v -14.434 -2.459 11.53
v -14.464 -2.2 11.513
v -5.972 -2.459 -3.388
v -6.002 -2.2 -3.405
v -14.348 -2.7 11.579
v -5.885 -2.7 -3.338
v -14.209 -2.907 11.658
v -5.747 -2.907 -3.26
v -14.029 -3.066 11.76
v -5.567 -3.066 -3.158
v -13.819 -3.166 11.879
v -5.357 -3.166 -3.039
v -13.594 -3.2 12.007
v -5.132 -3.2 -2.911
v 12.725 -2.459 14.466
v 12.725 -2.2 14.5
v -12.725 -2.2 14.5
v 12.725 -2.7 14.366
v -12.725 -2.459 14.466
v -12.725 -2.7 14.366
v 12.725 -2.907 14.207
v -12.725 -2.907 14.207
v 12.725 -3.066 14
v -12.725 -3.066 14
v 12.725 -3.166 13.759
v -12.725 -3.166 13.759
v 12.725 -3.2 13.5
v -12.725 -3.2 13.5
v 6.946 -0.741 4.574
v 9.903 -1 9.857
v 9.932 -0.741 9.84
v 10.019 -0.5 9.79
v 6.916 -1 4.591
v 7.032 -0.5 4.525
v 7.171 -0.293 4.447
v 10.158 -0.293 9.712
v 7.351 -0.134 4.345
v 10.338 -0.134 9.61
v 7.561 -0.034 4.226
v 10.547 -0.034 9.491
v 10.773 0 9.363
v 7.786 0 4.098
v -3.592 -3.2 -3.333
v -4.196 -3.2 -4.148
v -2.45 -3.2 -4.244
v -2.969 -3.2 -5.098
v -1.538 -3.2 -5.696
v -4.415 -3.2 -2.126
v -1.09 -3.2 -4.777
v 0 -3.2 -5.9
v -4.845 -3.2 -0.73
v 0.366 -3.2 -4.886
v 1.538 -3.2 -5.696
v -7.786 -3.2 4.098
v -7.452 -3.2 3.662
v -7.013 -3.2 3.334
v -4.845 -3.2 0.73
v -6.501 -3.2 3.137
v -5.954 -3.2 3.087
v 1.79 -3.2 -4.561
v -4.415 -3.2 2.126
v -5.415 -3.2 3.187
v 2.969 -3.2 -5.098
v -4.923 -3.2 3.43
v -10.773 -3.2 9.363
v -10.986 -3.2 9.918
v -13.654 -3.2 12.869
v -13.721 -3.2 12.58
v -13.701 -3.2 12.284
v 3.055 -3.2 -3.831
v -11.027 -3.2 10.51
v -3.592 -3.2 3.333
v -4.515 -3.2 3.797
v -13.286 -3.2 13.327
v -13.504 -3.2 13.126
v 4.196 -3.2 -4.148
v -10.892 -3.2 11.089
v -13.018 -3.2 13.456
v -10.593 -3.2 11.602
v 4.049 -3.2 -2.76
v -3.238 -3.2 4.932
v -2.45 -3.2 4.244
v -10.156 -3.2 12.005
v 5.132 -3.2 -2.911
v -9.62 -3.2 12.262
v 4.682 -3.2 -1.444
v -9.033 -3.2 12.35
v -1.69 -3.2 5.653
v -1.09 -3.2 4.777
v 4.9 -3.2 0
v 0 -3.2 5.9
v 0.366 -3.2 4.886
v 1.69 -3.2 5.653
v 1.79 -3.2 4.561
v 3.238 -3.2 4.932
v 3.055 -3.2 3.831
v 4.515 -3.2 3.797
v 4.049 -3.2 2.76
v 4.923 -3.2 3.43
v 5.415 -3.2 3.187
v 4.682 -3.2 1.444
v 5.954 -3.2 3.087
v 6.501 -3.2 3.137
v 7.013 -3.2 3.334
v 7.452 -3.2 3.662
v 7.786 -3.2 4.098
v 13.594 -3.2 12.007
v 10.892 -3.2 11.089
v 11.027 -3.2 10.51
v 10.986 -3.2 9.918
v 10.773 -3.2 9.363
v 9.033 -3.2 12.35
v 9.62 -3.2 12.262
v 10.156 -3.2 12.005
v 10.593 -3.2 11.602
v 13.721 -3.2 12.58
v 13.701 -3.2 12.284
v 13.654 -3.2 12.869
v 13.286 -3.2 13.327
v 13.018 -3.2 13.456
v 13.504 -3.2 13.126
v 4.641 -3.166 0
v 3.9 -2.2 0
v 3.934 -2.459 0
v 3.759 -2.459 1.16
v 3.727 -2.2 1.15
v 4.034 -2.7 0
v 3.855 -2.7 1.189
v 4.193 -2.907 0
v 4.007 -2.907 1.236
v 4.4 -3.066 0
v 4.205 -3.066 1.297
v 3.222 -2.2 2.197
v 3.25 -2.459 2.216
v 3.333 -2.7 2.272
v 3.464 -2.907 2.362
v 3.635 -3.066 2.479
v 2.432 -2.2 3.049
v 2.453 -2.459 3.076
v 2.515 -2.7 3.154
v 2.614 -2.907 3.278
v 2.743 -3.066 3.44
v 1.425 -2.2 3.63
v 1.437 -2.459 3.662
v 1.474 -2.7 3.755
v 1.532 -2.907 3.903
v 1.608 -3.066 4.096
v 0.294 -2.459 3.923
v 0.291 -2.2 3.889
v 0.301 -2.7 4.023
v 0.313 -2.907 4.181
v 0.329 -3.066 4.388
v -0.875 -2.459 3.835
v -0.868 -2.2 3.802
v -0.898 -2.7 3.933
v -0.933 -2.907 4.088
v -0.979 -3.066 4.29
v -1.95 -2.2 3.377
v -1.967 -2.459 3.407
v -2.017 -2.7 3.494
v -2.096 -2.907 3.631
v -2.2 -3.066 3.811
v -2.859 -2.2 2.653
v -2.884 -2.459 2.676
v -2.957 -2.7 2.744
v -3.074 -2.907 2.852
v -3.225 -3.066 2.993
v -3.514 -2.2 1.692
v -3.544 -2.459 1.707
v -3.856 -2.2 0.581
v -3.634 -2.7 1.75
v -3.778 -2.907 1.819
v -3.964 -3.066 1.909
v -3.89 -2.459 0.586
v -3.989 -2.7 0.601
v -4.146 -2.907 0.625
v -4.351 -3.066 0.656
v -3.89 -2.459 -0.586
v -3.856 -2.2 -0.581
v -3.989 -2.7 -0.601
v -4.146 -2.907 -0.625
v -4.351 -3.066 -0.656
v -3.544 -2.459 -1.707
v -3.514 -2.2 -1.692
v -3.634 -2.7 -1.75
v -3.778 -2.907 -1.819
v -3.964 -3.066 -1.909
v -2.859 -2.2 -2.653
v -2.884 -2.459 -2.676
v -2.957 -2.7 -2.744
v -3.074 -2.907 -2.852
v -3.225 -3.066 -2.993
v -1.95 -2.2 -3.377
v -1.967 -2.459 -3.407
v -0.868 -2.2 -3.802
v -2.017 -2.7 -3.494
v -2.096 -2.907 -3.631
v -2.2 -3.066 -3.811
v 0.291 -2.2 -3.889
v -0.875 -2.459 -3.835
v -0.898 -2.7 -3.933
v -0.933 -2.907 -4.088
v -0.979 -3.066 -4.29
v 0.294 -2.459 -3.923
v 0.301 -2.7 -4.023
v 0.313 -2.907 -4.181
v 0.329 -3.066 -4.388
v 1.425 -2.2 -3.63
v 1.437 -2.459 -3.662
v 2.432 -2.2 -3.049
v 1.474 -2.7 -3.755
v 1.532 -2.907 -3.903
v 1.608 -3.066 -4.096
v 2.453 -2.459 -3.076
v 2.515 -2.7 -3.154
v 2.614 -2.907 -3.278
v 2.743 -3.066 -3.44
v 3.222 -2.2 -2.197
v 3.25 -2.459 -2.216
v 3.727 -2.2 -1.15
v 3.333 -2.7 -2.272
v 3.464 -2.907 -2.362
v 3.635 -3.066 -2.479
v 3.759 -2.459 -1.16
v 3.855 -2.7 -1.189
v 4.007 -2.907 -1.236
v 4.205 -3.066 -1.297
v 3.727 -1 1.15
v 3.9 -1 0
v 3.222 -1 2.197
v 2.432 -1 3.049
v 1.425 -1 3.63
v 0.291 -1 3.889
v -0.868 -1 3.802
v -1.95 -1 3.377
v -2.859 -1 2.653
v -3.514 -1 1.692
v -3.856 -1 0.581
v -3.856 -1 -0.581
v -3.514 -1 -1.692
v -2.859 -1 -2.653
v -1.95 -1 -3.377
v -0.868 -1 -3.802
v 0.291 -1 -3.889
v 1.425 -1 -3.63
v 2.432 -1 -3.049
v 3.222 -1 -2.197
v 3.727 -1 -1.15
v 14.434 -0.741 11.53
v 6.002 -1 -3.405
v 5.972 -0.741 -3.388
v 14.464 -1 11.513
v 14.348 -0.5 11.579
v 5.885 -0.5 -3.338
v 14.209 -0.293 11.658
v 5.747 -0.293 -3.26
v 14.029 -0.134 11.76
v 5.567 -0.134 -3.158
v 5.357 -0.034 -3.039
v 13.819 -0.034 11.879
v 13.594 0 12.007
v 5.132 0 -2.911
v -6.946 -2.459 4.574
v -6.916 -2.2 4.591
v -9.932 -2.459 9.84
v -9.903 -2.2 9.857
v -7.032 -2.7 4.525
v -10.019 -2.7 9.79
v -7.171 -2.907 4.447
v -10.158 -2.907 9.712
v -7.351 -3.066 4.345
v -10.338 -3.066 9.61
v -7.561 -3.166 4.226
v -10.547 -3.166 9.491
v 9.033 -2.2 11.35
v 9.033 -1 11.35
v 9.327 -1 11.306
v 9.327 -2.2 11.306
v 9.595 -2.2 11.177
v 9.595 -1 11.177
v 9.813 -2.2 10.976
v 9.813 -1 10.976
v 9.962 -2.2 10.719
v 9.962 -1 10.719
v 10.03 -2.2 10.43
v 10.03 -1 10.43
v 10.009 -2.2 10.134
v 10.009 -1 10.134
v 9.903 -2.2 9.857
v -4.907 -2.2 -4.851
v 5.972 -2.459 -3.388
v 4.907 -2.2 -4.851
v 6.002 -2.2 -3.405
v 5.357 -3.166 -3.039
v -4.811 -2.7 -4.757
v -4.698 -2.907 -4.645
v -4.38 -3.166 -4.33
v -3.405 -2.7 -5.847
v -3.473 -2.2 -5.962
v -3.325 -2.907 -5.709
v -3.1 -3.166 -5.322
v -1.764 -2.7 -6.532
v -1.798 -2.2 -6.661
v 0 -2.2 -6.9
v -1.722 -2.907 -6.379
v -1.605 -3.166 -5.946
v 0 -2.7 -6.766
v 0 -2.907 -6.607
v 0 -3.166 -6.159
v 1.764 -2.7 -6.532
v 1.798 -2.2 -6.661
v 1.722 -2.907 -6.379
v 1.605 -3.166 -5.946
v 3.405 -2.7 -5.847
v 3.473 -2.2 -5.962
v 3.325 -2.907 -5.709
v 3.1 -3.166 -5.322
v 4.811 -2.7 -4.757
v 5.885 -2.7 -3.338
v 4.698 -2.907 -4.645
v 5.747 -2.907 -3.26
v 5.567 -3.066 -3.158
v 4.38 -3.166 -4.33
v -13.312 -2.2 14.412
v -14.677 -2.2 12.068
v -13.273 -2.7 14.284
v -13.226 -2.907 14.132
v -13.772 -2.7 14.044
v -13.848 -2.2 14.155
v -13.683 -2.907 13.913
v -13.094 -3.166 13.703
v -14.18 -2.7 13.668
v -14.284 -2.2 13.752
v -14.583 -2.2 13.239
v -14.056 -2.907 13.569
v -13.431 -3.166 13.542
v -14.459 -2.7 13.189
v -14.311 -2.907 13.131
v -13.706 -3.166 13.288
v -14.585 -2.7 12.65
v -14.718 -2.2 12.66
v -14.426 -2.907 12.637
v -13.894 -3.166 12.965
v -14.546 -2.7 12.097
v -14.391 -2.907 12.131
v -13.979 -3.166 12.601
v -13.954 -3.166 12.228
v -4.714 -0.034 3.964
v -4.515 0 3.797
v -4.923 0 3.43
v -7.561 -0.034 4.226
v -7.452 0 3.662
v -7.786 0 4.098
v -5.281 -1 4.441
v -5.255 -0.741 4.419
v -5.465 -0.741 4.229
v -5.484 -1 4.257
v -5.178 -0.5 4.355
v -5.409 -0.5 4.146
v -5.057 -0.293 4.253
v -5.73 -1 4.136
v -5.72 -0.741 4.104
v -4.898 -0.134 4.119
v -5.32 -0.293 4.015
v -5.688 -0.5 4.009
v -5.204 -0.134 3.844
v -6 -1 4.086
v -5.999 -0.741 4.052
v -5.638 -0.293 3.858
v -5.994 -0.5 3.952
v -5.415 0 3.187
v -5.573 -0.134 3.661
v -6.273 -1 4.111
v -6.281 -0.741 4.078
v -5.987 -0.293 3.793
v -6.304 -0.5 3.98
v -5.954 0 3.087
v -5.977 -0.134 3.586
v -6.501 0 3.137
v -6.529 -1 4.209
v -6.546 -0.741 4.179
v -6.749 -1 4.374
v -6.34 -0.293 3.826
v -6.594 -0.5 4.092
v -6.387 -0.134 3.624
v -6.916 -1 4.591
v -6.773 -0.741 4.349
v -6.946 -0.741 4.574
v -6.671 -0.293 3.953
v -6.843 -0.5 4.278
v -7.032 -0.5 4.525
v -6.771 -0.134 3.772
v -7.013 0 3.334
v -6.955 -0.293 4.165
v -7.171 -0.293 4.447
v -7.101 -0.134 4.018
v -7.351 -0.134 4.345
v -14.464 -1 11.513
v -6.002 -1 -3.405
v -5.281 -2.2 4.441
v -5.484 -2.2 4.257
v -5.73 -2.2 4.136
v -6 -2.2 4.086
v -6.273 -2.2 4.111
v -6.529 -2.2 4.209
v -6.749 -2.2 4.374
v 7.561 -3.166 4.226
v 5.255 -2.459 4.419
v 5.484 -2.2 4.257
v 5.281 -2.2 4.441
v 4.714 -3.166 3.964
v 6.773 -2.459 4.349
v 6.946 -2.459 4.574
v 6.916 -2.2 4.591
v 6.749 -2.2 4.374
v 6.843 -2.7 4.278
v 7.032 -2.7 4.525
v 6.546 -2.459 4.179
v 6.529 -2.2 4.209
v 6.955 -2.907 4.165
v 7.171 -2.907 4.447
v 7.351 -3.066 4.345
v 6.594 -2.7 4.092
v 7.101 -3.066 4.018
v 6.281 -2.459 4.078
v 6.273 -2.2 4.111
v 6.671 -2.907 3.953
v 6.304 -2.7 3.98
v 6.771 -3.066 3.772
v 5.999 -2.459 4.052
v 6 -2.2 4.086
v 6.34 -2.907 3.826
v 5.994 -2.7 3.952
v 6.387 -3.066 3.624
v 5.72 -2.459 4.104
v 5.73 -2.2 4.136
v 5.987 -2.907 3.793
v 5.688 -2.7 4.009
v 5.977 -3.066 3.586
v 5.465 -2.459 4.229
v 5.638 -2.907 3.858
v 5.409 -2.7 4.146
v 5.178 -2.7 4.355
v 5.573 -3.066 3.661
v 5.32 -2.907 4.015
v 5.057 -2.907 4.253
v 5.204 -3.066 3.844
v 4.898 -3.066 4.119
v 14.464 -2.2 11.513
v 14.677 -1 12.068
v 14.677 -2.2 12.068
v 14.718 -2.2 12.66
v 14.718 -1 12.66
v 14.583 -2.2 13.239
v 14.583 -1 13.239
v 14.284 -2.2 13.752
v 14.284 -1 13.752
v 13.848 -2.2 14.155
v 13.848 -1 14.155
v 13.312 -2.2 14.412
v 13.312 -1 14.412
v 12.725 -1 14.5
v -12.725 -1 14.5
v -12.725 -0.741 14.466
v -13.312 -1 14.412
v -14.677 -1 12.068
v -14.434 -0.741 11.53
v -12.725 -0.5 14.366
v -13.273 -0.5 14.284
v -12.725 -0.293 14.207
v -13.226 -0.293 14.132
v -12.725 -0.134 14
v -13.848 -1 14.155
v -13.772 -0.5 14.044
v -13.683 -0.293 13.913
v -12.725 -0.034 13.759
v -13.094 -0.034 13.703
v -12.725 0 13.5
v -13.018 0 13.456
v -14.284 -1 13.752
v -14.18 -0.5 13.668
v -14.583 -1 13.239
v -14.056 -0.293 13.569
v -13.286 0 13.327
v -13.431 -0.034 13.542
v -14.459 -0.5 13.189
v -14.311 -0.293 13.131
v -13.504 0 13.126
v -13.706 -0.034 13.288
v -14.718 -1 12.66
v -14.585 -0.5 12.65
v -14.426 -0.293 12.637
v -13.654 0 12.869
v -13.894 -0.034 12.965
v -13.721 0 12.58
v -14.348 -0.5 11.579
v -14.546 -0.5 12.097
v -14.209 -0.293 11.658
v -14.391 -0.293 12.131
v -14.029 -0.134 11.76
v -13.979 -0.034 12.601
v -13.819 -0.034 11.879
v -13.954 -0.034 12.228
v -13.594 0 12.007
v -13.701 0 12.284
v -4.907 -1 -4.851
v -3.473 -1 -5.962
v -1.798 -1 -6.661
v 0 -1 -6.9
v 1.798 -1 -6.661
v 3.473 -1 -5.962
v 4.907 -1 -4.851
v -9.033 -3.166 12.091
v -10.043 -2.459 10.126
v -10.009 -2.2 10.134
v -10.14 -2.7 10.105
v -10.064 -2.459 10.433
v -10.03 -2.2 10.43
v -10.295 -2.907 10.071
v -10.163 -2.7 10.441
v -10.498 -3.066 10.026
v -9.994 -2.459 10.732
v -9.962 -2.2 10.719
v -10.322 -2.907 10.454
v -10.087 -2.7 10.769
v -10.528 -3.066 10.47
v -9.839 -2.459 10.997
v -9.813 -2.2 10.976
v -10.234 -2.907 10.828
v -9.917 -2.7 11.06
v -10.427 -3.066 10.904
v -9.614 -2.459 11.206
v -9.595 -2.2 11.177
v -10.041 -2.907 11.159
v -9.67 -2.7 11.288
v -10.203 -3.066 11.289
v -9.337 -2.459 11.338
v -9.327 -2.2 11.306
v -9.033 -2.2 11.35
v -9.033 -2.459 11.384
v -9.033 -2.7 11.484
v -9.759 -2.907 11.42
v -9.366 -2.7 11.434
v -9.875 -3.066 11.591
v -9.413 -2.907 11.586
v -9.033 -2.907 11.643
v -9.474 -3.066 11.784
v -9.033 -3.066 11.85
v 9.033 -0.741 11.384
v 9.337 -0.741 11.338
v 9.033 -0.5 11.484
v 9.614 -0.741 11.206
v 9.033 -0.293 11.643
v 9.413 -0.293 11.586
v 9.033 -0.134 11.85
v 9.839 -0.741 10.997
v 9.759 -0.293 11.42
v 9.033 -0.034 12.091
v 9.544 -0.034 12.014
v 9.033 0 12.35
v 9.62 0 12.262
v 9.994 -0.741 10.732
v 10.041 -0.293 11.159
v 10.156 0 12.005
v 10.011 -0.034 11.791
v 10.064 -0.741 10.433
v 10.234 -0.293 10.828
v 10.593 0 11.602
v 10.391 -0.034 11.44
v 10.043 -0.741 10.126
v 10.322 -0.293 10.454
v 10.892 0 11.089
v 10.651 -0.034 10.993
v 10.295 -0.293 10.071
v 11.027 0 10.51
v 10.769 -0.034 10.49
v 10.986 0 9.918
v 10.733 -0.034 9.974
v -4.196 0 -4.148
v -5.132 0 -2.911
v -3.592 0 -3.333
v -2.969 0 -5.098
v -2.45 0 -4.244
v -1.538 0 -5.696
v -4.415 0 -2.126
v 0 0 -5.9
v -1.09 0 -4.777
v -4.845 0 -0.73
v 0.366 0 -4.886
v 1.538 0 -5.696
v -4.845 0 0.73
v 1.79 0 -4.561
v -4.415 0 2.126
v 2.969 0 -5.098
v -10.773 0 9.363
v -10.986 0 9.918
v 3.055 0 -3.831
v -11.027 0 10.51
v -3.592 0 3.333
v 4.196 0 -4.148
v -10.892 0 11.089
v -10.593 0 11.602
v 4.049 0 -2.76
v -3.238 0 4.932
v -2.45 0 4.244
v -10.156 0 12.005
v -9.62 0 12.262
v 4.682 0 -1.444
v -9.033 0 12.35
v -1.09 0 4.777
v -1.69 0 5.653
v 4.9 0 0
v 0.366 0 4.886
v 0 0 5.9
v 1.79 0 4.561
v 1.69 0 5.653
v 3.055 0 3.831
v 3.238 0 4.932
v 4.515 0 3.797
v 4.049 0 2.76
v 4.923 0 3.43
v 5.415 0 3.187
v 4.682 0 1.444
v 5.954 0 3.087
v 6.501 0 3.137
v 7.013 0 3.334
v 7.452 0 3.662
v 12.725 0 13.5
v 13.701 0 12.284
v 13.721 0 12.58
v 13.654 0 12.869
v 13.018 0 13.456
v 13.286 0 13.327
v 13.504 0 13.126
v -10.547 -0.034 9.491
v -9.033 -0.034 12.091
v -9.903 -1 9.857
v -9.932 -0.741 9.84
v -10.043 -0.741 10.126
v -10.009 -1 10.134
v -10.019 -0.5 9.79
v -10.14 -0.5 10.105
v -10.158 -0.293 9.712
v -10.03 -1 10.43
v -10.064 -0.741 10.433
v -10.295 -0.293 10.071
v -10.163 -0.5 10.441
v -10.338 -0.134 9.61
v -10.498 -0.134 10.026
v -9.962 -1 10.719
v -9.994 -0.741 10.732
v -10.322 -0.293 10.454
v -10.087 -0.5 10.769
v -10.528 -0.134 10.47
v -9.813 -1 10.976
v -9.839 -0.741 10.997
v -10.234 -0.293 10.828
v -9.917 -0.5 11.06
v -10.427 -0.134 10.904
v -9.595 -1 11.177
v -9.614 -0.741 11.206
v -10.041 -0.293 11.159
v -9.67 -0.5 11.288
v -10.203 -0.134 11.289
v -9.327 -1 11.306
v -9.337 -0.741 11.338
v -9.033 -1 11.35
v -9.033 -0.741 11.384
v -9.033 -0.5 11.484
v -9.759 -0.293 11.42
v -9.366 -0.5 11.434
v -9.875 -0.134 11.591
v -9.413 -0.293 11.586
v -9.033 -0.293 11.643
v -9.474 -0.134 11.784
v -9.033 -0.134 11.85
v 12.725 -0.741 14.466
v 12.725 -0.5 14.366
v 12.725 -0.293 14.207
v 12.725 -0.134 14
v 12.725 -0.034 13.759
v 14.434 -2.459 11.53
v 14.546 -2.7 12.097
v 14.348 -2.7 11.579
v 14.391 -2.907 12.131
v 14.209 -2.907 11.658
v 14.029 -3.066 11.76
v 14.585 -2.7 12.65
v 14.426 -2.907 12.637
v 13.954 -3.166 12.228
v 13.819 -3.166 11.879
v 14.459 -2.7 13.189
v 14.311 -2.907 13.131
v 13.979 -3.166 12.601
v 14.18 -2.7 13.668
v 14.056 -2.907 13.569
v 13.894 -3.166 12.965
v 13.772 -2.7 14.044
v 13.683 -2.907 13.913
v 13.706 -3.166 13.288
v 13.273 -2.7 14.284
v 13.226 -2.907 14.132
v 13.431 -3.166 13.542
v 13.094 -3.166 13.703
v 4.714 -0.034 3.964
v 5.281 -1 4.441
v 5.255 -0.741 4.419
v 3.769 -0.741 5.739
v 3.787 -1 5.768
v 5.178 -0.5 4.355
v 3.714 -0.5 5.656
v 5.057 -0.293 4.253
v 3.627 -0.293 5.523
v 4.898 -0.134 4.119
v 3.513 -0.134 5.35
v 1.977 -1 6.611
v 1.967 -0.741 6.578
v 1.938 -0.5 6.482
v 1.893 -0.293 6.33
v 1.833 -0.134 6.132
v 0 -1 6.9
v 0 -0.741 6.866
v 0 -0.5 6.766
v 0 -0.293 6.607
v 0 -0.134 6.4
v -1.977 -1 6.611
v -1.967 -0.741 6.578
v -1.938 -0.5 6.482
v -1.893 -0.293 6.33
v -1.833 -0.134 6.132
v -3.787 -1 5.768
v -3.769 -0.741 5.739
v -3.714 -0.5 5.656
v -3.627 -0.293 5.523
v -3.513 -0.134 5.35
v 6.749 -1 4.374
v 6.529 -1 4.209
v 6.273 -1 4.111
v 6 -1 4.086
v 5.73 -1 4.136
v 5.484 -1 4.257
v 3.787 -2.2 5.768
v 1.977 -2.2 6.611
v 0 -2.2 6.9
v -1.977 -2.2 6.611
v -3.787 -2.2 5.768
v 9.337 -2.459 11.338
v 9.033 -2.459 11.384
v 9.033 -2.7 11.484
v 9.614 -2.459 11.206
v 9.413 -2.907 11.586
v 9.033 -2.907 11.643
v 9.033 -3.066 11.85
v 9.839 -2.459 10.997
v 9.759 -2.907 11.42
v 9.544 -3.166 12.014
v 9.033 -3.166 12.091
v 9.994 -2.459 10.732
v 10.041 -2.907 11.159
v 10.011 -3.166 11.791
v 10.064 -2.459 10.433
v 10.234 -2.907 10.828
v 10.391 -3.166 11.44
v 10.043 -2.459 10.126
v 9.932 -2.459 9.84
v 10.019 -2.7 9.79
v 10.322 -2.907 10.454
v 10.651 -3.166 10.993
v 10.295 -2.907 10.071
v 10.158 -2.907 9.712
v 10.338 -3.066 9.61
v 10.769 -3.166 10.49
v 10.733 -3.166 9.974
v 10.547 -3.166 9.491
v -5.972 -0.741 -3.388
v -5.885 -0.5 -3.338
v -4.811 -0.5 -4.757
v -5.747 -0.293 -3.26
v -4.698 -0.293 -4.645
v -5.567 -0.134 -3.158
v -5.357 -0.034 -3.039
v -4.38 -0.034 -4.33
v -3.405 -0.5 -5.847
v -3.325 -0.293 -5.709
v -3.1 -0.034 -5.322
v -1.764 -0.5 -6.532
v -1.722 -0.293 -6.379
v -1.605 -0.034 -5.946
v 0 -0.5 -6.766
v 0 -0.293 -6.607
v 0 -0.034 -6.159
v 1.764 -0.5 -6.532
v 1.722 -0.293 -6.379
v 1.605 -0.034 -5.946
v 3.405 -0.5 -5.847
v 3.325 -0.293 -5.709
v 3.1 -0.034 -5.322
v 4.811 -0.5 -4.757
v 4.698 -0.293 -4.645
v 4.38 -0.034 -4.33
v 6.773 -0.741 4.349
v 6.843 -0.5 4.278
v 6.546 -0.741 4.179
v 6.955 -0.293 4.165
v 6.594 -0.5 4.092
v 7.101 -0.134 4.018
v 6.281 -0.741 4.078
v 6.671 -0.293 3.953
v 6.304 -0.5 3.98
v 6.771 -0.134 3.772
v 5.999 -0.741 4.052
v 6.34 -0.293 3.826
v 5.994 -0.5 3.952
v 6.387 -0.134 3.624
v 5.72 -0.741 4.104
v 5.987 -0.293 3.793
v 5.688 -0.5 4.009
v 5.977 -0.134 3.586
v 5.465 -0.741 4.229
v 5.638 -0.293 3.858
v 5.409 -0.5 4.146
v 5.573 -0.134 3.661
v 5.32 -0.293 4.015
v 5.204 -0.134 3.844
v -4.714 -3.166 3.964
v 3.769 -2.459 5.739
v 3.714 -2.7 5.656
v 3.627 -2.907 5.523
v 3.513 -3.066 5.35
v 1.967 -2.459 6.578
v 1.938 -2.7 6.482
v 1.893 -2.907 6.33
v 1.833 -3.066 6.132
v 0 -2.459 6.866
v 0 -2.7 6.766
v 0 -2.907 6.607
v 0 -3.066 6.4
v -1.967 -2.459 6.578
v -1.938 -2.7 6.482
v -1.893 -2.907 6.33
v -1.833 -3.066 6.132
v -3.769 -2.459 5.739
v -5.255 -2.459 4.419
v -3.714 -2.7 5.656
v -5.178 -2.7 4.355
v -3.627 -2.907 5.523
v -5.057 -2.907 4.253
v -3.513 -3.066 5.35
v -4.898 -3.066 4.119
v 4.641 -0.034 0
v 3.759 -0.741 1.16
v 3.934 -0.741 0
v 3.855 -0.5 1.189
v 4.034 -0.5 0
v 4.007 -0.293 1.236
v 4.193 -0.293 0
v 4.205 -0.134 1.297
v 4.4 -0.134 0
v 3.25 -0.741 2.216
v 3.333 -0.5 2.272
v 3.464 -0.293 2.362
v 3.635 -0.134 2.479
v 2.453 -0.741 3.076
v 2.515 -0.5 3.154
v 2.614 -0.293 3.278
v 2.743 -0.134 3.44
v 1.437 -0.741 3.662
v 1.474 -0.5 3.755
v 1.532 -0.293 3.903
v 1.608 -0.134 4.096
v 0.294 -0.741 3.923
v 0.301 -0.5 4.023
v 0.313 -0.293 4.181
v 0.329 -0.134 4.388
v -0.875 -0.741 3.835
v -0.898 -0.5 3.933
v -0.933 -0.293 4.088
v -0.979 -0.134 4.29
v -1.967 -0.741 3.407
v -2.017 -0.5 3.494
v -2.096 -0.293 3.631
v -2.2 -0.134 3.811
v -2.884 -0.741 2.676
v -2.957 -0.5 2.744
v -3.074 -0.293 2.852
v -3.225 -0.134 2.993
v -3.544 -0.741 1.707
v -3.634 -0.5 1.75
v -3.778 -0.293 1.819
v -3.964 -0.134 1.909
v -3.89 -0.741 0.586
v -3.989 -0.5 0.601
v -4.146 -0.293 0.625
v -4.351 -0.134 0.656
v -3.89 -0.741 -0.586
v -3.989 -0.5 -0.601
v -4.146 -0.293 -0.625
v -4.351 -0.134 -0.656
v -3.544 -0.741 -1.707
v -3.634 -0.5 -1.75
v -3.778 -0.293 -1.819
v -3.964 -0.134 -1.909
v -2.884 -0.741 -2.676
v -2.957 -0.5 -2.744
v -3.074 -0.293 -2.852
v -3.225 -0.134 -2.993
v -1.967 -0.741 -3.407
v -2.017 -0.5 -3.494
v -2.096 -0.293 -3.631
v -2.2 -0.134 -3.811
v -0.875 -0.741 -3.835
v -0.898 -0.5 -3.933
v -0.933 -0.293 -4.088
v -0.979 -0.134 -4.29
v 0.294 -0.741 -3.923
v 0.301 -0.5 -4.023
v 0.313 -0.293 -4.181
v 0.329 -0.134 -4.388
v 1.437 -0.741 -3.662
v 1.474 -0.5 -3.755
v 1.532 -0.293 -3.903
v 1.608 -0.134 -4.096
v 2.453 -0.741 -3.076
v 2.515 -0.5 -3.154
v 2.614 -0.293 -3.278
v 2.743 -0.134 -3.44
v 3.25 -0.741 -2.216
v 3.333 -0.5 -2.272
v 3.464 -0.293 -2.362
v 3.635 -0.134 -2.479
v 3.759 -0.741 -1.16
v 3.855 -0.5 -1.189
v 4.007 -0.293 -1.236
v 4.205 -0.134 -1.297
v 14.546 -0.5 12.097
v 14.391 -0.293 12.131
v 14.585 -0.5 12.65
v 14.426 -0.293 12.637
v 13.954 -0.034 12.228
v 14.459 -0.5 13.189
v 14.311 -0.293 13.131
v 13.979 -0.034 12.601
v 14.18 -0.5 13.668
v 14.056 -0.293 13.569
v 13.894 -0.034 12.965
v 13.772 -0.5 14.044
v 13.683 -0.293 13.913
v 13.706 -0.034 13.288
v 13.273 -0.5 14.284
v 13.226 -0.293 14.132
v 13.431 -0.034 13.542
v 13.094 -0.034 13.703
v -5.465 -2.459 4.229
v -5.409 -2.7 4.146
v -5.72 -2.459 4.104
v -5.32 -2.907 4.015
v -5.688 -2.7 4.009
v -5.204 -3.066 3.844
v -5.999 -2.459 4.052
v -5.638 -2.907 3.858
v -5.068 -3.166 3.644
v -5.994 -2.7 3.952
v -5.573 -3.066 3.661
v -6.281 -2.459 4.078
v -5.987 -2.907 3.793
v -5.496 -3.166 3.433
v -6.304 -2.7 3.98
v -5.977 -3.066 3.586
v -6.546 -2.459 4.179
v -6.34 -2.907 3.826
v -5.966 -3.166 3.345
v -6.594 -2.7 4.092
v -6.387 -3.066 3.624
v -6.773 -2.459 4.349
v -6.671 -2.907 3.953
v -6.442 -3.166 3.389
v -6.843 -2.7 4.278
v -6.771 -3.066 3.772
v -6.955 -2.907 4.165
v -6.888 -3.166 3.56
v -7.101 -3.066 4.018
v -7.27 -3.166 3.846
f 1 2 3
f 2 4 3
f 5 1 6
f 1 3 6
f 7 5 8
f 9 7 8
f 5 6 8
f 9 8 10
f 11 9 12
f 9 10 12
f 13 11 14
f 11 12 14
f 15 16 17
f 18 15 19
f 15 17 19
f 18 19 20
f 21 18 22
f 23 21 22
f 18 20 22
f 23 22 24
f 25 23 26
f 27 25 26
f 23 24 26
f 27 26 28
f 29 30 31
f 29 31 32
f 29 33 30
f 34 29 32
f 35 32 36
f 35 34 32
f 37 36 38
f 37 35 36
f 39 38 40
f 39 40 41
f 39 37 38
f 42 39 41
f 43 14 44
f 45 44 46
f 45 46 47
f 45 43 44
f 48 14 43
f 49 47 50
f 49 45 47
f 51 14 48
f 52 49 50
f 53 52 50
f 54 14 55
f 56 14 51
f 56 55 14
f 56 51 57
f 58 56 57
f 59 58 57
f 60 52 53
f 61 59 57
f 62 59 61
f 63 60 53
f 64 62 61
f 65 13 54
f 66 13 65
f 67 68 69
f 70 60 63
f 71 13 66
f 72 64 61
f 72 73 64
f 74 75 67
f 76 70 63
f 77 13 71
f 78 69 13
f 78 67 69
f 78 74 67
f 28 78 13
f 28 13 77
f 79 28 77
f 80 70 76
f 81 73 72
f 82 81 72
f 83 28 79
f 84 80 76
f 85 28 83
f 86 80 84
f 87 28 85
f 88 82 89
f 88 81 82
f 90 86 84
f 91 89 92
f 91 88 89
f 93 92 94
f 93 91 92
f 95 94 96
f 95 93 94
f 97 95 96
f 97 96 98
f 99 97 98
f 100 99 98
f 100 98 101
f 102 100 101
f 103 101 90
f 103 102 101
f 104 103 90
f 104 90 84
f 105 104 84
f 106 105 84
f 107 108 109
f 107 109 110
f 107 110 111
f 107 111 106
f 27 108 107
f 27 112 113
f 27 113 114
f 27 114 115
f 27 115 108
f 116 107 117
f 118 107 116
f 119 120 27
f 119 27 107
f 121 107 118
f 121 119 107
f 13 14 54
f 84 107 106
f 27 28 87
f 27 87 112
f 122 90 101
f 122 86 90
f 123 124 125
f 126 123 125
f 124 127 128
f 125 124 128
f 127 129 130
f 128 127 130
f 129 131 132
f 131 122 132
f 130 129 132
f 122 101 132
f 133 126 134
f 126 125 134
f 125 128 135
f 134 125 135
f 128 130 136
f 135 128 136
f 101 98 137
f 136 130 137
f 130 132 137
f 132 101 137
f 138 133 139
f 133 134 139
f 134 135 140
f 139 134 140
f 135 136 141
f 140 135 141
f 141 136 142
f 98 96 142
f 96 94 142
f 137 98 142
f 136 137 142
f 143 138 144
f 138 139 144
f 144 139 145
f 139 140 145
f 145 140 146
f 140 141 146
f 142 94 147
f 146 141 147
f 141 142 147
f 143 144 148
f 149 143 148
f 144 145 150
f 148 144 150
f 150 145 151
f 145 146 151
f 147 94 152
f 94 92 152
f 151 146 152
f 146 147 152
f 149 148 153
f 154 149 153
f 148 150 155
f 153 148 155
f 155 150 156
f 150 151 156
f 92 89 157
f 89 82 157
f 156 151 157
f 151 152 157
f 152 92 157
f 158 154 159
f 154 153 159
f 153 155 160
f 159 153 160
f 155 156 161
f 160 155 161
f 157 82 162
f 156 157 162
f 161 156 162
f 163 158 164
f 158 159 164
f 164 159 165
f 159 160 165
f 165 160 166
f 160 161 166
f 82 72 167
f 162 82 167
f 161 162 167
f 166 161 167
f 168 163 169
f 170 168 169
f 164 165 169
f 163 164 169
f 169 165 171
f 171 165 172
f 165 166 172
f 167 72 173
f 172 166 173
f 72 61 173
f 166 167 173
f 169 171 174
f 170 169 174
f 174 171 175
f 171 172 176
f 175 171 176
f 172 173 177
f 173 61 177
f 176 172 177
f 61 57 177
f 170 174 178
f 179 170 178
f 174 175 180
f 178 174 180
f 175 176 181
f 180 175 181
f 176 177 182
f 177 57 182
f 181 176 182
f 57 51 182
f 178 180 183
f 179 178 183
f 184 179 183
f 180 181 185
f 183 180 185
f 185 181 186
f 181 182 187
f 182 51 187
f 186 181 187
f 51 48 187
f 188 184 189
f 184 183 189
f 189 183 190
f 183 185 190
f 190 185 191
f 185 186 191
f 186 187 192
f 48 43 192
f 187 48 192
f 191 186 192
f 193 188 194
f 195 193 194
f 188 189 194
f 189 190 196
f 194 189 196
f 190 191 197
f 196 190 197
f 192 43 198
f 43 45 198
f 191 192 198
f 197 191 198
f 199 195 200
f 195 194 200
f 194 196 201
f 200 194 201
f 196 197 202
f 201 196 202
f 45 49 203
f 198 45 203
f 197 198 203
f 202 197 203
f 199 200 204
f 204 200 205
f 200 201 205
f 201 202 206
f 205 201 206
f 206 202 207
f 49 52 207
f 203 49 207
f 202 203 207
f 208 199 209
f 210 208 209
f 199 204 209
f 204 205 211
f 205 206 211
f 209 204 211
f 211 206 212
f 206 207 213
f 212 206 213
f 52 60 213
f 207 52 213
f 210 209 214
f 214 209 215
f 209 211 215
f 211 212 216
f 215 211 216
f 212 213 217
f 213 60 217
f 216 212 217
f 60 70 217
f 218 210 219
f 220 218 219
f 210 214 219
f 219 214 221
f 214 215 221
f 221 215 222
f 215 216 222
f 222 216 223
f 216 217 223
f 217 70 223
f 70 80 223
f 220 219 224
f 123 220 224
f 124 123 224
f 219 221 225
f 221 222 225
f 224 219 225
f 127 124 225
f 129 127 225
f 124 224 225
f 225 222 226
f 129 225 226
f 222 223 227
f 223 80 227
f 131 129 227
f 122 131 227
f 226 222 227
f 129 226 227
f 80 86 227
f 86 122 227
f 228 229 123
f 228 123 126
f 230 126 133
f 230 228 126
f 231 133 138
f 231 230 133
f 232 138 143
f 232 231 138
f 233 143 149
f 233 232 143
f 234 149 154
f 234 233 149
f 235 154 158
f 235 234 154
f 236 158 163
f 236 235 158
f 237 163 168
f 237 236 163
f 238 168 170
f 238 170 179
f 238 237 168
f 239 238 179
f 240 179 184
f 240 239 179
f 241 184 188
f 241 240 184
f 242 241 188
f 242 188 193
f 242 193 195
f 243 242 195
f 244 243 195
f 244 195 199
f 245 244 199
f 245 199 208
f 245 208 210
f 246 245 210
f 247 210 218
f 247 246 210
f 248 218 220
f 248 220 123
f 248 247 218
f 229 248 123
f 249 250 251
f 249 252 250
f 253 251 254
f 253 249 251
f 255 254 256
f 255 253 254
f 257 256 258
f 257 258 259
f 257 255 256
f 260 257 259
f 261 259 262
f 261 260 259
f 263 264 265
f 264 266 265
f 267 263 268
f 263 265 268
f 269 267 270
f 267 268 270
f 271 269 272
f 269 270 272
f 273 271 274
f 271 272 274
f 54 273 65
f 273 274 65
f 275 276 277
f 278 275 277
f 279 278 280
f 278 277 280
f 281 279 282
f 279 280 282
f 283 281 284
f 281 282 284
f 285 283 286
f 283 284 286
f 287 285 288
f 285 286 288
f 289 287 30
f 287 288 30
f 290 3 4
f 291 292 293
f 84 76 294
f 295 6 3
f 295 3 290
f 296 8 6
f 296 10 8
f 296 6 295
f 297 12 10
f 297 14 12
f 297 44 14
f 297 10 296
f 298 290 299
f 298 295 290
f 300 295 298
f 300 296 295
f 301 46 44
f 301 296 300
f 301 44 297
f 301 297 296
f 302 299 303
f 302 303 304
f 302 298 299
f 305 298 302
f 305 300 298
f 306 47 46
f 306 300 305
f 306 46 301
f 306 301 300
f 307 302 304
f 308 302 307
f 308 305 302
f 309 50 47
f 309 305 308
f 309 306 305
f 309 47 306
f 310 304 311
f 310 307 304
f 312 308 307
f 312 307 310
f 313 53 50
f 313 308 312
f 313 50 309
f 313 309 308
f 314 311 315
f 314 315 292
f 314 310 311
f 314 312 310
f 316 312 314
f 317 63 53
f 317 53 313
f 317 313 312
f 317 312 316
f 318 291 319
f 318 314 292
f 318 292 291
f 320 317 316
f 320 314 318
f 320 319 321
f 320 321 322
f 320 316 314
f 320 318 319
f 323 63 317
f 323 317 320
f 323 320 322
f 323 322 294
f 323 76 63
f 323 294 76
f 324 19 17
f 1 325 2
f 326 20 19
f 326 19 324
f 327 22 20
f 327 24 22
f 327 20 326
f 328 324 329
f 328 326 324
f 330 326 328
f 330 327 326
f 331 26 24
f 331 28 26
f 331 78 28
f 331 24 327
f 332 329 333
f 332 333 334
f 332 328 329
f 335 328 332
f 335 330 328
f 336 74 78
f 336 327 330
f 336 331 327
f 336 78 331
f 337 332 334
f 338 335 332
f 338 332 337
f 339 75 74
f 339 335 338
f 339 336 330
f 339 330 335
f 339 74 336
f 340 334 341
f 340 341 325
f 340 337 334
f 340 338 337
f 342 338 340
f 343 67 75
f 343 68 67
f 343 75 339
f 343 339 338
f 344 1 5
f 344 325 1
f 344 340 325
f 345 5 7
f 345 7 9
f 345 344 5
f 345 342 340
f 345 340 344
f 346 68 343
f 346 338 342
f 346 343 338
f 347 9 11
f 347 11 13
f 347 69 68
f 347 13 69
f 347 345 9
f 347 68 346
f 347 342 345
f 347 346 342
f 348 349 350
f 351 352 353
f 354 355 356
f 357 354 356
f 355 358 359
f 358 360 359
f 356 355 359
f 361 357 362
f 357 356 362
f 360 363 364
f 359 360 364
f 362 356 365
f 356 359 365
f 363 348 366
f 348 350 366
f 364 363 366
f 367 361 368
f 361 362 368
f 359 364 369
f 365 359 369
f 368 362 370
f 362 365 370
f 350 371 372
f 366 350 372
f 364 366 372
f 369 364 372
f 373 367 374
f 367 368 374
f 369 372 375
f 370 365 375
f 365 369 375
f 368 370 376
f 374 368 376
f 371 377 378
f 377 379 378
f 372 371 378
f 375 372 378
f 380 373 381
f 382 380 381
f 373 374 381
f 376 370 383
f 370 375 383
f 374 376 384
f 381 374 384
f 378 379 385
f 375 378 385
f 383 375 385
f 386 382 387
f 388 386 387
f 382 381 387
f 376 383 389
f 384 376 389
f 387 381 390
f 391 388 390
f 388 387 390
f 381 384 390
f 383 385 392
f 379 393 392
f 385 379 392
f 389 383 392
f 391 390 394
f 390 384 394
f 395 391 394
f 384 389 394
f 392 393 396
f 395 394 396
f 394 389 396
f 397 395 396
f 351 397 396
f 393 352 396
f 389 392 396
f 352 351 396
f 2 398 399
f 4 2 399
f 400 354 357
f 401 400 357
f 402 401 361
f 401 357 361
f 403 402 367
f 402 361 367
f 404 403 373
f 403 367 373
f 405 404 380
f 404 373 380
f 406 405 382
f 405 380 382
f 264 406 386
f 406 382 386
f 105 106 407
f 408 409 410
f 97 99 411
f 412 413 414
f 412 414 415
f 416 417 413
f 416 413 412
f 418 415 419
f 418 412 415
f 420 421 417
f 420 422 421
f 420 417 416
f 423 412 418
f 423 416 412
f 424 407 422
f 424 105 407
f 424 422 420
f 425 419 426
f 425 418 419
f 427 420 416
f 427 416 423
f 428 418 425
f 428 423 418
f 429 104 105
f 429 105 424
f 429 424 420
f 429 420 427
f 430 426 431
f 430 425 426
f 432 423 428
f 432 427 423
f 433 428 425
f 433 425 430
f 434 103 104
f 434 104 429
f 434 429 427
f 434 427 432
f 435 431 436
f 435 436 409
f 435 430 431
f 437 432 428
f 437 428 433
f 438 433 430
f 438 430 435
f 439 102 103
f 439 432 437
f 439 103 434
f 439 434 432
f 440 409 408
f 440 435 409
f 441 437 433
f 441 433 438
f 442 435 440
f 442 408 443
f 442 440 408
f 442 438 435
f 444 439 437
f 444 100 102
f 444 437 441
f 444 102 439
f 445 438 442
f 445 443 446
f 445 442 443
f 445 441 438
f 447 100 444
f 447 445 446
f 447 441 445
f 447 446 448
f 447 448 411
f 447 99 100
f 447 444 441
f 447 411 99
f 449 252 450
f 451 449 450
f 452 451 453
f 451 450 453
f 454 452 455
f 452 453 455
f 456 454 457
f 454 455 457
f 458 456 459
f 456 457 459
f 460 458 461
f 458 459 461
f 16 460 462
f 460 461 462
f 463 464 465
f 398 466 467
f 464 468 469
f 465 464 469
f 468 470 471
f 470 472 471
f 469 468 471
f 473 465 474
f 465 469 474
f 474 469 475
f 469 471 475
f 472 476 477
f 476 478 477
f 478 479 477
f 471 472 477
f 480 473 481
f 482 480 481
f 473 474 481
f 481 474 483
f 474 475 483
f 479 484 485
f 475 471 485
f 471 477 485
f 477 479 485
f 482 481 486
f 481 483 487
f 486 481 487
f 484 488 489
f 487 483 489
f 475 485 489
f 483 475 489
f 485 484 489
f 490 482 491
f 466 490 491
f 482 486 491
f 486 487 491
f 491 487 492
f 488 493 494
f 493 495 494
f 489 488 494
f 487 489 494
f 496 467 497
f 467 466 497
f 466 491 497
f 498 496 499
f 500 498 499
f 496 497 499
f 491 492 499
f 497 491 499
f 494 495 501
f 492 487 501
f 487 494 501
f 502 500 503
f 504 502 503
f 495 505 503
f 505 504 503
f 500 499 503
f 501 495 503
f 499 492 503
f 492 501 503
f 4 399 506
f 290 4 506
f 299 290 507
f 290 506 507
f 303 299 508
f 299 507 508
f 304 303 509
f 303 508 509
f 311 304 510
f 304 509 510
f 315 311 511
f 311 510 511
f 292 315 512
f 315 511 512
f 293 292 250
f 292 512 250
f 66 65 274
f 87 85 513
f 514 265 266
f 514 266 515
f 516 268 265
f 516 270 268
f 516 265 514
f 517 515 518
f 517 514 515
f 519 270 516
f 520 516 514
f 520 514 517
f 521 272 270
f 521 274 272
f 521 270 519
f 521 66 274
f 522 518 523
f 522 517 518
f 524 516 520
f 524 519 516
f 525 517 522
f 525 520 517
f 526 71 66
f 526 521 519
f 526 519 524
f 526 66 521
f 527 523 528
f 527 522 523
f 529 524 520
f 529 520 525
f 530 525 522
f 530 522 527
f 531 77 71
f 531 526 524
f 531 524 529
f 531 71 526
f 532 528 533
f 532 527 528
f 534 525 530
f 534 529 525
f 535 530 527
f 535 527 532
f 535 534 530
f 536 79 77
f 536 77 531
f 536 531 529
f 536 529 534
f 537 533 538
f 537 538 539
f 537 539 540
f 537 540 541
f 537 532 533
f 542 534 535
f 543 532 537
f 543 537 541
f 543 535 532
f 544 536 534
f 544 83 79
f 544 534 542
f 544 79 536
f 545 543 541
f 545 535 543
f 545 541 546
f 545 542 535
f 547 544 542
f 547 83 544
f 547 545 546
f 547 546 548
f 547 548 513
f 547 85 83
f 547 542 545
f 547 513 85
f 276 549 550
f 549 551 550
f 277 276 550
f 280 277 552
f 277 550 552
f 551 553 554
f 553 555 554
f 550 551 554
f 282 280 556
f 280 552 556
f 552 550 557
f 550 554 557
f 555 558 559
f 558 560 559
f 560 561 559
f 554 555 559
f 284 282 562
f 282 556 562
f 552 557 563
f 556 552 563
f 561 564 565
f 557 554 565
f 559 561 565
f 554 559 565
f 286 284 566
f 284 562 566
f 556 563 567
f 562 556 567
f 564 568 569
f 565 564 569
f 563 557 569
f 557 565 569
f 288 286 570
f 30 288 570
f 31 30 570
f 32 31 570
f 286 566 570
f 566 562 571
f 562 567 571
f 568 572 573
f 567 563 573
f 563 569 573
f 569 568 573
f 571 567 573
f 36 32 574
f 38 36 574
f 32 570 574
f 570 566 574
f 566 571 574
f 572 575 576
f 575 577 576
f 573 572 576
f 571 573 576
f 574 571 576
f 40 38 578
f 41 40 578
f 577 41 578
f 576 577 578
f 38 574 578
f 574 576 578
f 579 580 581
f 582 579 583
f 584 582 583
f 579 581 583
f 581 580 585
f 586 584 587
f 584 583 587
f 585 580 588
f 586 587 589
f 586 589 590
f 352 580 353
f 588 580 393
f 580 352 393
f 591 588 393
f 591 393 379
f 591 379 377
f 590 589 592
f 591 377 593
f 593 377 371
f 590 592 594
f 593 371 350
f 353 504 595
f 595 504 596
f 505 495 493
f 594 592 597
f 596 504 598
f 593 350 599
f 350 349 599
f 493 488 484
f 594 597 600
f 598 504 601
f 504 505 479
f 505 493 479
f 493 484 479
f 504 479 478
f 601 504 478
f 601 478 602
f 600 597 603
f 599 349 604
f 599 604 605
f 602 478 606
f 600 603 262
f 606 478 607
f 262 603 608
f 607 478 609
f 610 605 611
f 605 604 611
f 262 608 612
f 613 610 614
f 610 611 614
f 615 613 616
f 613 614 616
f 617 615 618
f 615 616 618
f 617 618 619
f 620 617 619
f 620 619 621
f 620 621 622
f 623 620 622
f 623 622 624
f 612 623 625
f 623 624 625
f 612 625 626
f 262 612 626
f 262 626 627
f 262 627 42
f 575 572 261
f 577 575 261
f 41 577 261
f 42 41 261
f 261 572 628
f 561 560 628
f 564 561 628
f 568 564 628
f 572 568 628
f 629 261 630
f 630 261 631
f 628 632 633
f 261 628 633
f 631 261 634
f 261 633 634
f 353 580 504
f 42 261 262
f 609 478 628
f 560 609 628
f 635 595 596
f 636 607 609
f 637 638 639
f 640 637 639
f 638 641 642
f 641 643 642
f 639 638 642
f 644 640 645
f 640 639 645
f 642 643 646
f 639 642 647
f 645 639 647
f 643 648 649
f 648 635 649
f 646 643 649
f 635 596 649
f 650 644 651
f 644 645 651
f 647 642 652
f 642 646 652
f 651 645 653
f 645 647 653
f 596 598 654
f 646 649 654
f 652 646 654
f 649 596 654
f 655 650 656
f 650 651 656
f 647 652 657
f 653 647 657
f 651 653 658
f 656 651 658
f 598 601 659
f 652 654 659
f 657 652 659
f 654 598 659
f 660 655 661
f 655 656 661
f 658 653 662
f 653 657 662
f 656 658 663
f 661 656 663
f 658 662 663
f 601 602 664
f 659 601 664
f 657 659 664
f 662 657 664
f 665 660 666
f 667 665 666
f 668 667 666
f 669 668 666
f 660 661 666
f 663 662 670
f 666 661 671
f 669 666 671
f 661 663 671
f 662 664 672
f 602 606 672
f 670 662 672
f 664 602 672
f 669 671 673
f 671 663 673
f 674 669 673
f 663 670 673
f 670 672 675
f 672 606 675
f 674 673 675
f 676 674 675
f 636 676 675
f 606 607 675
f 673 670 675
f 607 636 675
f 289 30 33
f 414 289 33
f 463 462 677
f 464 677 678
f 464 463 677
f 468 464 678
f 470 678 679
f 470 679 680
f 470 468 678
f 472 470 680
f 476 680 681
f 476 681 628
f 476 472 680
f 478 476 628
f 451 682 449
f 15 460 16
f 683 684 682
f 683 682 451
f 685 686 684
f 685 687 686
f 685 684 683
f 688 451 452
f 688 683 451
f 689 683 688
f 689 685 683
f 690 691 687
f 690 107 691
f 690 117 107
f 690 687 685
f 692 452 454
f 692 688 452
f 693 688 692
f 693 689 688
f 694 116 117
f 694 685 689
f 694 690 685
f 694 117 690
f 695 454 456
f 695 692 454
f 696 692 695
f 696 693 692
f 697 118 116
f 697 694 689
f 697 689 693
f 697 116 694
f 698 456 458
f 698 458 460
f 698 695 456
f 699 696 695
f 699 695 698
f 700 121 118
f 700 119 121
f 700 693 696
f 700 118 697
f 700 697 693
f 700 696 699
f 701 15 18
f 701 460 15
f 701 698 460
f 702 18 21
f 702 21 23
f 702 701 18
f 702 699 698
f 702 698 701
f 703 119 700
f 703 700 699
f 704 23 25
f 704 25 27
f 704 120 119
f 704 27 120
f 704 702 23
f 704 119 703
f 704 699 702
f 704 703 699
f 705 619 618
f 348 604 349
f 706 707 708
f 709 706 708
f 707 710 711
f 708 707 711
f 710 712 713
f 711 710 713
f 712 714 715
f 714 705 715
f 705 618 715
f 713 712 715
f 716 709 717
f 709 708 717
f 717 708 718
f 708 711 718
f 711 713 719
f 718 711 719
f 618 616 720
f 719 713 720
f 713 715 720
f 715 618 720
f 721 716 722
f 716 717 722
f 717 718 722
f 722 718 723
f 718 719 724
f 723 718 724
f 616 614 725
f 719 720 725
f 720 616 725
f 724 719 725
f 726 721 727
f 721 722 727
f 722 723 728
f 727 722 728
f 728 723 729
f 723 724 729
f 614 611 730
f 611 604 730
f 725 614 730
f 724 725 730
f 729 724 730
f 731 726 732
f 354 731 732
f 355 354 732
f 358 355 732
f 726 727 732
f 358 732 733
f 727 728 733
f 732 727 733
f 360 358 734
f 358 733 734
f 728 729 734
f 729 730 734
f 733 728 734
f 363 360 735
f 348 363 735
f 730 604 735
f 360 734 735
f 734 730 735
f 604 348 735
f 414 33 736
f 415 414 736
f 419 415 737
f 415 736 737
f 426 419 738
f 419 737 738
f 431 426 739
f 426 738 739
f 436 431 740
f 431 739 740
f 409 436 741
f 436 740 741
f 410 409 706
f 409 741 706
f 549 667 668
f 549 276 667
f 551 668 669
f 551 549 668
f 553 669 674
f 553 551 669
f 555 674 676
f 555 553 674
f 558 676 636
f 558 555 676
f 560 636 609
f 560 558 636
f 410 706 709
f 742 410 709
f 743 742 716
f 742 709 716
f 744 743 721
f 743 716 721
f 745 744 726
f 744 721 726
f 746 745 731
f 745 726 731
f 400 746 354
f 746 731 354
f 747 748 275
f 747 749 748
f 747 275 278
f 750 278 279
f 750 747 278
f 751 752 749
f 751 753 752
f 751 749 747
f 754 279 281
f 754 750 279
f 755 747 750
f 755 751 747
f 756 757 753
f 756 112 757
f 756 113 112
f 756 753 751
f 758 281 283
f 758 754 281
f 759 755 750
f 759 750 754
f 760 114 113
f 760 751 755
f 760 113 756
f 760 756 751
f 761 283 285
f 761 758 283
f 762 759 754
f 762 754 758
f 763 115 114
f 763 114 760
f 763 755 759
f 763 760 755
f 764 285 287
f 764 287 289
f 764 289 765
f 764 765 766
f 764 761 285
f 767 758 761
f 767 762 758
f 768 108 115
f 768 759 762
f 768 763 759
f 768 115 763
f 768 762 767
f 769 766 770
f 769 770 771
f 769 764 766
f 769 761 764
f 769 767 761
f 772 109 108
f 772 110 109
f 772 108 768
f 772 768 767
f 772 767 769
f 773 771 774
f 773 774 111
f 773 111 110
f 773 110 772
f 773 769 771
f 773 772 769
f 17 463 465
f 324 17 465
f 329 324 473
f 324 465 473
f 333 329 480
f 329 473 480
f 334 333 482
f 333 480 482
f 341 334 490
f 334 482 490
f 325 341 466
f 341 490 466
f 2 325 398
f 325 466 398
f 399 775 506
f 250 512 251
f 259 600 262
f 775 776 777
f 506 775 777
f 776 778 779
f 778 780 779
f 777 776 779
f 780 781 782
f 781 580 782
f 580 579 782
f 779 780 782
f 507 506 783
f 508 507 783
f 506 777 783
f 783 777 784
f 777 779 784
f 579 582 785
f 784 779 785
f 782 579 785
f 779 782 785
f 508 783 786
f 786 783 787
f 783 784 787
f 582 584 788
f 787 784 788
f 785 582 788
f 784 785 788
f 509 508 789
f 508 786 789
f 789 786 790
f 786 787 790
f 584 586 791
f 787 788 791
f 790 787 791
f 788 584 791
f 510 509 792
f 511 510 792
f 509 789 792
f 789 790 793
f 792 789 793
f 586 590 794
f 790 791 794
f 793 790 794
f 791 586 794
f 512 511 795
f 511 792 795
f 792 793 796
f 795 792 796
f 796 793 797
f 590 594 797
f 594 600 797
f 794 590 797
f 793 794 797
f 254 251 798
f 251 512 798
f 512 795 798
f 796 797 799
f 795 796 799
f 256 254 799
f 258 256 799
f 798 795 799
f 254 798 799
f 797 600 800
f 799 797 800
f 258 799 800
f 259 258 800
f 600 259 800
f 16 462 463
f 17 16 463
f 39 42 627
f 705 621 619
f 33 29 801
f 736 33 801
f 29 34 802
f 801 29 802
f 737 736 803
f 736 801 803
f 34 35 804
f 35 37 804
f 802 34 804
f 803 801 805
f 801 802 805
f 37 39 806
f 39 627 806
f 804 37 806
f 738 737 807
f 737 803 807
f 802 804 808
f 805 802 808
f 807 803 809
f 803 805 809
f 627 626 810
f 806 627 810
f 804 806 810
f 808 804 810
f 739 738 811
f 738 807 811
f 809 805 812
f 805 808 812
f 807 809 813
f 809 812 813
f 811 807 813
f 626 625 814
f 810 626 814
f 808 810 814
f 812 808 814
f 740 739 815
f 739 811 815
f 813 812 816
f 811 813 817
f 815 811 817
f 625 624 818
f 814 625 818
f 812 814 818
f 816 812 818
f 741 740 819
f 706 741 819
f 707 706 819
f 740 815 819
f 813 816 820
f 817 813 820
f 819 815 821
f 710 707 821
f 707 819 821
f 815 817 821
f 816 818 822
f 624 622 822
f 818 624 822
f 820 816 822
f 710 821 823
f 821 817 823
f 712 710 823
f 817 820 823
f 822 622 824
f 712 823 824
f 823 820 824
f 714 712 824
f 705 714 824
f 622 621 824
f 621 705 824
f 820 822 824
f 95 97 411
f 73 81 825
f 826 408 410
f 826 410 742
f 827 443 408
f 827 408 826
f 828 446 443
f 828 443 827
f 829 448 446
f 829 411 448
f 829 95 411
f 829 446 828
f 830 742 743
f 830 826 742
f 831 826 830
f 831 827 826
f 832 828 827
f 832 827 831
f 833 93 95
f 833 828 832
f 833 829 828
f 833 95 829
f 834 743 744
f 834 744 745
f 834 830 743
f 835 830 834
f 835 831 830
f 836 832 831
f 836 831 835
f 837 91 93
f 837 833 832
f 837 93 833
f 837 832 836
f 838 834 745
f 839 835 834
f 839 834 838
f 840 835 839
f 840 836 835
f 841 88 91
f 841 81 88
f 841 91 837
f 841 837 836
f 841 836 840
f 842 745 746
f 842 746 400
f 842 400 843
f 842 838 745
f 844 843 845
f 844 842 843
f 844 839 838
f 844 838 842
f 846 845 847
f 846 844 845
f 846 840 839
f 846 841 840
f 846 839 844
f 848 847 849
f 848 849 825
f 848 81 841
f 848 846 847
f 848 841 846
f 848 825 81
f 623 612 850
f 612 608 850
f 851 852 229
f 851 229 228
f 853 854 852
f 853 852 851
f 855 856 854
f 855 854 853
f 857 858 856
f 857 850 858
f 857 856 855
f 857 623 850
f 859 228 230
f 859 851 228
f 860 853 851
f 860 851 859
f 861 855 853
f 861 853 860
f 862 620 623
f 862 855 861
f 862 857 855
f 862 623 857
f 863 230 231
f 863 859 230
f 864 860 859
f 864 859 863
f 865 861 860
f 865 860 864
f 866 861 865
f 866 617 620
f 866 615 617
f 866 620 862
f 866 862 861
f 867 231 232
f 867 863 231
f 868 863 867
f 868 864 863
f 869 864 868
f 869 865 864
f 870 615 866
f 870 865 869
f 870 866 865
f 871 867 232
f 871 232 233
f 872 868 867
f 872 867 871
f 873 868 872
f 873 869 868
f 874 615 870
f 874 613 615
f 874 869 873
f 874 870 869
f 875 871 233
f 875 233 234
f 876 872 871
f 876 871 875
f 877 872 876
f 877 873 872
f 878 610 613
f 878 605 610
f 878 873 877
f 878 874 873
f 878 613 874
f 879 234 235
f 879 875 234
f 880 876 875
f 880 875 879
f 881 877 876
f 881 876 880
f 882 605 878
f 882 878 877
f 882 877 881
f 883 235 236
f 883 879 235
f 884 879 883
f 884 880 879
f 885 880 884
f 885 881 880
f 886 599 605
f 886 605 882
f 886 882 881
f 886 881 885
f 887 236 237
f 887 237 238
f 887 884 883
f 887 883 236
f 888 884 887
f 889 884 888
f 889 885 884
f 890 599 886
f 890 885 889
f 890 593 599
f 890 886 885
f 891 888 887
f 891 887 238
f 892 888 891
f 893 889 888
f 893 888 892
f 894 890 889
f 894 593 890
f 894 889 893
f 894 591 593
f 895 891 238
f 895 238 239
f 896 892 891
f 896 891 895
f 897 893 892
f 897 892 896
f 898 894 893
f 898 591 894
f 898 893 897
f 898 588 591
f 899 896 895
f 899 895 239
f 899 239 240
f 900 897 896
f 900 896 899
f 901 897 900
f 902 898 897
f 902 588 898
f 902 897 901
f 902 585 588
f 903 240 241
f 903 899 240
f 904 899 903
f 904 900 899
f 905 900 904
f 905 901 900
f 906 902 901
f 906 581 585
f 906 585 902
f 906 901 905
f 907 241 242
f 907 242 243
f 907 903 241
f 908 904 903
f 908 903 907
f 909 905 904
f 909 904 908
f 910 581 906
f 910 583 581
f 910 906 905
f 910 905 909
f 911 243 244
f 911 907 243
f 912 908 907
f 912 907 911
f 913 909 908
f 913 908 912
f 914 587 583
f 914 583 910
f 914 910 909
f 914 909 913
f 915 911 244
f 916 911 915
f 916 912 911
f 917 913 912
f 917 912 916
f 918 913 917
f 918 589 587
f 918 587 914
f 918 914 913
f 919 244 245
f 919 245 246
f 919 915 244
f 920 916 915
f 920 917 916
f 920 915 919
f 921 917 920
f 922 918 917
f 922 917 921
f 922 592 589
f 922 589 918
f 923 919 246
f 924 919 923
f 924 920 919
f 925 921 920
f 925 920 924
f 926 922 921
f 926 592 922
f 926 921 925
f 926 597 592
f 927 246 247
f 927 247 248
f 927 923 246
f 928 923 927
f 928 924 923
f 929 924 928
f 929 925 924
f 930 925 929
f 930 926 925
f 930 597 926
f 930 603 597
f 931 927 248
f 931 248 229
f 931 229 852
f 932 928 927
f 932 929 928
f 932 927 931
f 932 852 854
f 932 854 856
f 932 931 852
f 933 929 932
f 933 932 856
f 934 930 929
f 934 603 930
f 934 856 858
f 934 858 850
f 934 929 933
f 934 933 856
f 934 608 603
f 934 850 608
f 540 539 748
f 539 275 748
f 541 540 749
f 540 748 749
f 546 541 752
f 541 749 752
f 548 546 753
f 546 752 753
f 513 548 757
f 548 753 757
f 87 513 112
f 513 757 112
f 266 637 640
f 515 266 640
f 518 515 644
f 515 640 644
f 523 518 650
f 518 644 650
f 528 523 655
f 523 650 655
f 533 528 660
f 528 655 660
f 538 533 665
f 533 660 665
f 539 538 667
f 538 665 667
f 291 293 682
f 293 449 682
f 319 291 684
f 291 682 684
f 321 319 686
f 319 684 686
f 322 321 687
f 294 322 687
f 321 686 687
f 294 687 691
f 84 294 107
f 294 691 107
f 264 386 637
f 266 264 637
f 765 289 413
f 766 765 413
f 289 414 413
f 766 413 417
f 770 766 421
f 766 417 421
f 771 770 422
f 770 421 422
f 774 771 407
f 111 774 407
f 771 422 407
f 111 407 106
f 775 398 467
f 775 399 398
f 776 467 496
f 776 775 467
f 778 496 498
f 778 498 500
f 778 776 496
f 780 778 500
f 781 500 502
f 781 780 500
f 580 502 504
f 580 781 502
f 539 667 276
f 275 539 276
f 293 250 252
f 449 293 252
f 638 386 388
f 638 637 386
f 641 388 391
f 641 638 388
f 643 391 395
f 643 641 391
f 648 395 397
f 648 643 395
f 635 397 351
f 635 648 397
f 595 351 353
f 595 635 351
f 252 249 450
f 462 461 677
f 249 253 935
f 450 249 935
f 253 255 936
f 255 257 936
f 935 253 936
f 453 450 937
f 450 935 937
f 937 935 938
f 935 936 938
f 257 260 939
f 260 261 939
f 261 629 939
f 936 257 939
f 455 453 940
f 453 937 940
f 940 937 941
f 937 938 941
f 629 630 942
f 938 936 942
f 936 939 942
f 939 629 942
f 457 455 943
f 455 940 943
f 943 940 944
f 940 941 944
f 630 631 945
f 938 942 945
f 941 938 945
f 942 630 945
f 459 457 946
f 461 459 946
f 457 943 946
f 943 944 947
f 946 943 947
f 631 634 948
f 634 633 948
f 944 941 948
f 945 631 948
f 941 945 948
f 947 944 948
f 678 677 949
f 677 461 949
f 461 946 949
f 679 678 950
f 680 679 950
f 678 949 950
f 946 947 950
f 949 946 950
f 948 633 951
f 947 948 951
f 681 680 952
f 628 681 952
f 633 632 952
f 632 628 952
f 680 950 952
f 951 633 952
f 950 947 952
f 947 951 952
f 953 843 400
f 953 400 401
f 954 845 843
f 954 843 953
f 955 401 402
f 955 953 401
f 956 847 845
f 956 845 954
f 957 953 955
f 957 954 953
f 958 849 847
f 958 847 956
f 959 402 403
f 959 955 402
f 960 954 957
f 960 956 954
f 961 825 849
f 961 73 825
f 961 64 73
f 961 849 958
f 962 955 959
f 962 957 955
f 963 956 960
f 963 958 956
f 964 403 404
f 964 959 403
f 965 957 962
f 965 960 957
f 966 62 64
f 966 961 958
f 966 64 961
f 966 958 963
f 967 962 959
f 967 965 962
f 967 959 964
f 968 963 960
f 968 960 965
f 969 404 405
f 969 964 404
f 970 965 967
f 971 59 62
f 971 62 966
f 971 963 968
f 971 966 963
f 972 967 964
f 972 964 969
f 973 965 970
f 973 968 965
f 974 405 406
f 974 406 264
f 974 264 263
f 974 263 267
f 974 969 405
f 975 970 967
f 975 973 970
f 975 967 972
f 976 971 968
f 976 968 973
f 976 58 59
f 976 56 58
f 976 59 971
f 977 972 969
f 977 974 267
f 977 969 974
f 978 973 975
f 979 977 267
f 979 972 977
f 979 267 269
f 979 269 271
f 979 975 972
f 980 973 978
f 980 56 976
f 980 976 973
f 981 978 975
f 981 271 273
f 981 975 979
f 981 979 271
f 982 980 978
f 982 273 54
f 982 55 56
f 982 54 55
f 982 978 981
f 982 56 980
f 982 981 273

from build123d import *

# Parameters (mm, degrees)
F0_R     = 3.9
F1_DEPTH = 3.2
F2_R     = 1


with BuildPart() as f1:
    # F0 (on Front) → F1 (new body)
    with BuildSketch(Plane.XZ):
        with BuildLine():
            Line((-14.464112, 11.513167), (-6.001573, -3.404574))
            ThreePointArc((-6.001573, -3.404574), (0, -6.9), (6.001573, -3.404574))
            Line((6.001573, -3.404574), (14.464112, 11.513167))
            ThreePointArc((14.464112, 11.513167), (14.452771, 13.506562), (12.724526, 14.5))
            Line((12.724526, 14.5), (-12.724526, 14.5))
            ThreePointArc((-12.724526, 14.5), (-14.452771, 13.506562), (-14.464112, 11.513167))
        make_face()
        Circle(F0_R, mode=Mode.SUBTRACT)
        with BuildLine():
            ThreePointArc((-9.902814, 9.856584), (-9.897144, 10.853281), (-9.033021, 11.35))
            Line((-9.033021, 11.35), (9.033021, 11.35))
            ThreePointArc((9.033021, 11.35), (9.897144, 10.853281), (9.902814, 9.856584))
            Line((9.902814, 9.856584), (6.915922, 4.591298))
            ThreePointArc((6.915922, 4.591298), (6.137613, 4.088908), (5.280796, 4.44108))
            ThreePointArc((5.280796, 4.44108), (0, 6.9), (-5.280796, 4.44108))
            ThreePointArc((-5.280796, 4.44108), (-6.137613, 4.088908), (-6.915922, 4.591298))
            Line((-6.915922, 4.591298), (-9.902814, 9.856584))
        make_face(mode=Mode.SUBTRACT)
    extrude(amount=F1_DEPTH)

    # F2
    f2_edges = [f1.edges().sort_by_distance(p)[0] for p in [
        (-10.232843, -3.2, 4.054297),
        (0, -3.2, -6.9),
        (10.232843, -3.2, 4.054297),
        (14.452771, -3.2, 13.506562),
        (0, -3.2, 14.5),
        (-14.452771, -3.2, 13.506562),
        (-3.9, -3.2, 0),
        (8.409368, -3.2, 7.223941),
        (6.137613, -3.2, 4.088908),
        (0, -3.2, 6.9),
        (-6.137613, -3.2, 4.088908),
        (-8.409368, -3.2, 7.223941),
        (-9.897144, -3.2, 10.853281),
        (0, -3.2, 11.35),
        (9.897144, -3.2, 10.853281),
        (-10.232843, 0, 4.054297),
        (0, 0, -6.9),
        (10.232843, 0, 4.054297),
        (14.452771, 0, 13.506562),
        (0, 0, 14.5),
        (-14.452771, 0, 13.506562),
        (-3.9, 0, 0),
        (8.409368, 0, 7.223941),
        (6.137613, 0, 4.088908),
        (0, 0, 6.9),
        (-6.137613, 0, 4.088908),
        (-8.409368, 0, 7.223941),
        (-9.897144, 0, 10.853281),
        (0, 0, 11.35),
        (9.897144, 0, 10.853281),
    ]]
    fillet(f2_edges, radius=F2_R)


solid = f1.part
